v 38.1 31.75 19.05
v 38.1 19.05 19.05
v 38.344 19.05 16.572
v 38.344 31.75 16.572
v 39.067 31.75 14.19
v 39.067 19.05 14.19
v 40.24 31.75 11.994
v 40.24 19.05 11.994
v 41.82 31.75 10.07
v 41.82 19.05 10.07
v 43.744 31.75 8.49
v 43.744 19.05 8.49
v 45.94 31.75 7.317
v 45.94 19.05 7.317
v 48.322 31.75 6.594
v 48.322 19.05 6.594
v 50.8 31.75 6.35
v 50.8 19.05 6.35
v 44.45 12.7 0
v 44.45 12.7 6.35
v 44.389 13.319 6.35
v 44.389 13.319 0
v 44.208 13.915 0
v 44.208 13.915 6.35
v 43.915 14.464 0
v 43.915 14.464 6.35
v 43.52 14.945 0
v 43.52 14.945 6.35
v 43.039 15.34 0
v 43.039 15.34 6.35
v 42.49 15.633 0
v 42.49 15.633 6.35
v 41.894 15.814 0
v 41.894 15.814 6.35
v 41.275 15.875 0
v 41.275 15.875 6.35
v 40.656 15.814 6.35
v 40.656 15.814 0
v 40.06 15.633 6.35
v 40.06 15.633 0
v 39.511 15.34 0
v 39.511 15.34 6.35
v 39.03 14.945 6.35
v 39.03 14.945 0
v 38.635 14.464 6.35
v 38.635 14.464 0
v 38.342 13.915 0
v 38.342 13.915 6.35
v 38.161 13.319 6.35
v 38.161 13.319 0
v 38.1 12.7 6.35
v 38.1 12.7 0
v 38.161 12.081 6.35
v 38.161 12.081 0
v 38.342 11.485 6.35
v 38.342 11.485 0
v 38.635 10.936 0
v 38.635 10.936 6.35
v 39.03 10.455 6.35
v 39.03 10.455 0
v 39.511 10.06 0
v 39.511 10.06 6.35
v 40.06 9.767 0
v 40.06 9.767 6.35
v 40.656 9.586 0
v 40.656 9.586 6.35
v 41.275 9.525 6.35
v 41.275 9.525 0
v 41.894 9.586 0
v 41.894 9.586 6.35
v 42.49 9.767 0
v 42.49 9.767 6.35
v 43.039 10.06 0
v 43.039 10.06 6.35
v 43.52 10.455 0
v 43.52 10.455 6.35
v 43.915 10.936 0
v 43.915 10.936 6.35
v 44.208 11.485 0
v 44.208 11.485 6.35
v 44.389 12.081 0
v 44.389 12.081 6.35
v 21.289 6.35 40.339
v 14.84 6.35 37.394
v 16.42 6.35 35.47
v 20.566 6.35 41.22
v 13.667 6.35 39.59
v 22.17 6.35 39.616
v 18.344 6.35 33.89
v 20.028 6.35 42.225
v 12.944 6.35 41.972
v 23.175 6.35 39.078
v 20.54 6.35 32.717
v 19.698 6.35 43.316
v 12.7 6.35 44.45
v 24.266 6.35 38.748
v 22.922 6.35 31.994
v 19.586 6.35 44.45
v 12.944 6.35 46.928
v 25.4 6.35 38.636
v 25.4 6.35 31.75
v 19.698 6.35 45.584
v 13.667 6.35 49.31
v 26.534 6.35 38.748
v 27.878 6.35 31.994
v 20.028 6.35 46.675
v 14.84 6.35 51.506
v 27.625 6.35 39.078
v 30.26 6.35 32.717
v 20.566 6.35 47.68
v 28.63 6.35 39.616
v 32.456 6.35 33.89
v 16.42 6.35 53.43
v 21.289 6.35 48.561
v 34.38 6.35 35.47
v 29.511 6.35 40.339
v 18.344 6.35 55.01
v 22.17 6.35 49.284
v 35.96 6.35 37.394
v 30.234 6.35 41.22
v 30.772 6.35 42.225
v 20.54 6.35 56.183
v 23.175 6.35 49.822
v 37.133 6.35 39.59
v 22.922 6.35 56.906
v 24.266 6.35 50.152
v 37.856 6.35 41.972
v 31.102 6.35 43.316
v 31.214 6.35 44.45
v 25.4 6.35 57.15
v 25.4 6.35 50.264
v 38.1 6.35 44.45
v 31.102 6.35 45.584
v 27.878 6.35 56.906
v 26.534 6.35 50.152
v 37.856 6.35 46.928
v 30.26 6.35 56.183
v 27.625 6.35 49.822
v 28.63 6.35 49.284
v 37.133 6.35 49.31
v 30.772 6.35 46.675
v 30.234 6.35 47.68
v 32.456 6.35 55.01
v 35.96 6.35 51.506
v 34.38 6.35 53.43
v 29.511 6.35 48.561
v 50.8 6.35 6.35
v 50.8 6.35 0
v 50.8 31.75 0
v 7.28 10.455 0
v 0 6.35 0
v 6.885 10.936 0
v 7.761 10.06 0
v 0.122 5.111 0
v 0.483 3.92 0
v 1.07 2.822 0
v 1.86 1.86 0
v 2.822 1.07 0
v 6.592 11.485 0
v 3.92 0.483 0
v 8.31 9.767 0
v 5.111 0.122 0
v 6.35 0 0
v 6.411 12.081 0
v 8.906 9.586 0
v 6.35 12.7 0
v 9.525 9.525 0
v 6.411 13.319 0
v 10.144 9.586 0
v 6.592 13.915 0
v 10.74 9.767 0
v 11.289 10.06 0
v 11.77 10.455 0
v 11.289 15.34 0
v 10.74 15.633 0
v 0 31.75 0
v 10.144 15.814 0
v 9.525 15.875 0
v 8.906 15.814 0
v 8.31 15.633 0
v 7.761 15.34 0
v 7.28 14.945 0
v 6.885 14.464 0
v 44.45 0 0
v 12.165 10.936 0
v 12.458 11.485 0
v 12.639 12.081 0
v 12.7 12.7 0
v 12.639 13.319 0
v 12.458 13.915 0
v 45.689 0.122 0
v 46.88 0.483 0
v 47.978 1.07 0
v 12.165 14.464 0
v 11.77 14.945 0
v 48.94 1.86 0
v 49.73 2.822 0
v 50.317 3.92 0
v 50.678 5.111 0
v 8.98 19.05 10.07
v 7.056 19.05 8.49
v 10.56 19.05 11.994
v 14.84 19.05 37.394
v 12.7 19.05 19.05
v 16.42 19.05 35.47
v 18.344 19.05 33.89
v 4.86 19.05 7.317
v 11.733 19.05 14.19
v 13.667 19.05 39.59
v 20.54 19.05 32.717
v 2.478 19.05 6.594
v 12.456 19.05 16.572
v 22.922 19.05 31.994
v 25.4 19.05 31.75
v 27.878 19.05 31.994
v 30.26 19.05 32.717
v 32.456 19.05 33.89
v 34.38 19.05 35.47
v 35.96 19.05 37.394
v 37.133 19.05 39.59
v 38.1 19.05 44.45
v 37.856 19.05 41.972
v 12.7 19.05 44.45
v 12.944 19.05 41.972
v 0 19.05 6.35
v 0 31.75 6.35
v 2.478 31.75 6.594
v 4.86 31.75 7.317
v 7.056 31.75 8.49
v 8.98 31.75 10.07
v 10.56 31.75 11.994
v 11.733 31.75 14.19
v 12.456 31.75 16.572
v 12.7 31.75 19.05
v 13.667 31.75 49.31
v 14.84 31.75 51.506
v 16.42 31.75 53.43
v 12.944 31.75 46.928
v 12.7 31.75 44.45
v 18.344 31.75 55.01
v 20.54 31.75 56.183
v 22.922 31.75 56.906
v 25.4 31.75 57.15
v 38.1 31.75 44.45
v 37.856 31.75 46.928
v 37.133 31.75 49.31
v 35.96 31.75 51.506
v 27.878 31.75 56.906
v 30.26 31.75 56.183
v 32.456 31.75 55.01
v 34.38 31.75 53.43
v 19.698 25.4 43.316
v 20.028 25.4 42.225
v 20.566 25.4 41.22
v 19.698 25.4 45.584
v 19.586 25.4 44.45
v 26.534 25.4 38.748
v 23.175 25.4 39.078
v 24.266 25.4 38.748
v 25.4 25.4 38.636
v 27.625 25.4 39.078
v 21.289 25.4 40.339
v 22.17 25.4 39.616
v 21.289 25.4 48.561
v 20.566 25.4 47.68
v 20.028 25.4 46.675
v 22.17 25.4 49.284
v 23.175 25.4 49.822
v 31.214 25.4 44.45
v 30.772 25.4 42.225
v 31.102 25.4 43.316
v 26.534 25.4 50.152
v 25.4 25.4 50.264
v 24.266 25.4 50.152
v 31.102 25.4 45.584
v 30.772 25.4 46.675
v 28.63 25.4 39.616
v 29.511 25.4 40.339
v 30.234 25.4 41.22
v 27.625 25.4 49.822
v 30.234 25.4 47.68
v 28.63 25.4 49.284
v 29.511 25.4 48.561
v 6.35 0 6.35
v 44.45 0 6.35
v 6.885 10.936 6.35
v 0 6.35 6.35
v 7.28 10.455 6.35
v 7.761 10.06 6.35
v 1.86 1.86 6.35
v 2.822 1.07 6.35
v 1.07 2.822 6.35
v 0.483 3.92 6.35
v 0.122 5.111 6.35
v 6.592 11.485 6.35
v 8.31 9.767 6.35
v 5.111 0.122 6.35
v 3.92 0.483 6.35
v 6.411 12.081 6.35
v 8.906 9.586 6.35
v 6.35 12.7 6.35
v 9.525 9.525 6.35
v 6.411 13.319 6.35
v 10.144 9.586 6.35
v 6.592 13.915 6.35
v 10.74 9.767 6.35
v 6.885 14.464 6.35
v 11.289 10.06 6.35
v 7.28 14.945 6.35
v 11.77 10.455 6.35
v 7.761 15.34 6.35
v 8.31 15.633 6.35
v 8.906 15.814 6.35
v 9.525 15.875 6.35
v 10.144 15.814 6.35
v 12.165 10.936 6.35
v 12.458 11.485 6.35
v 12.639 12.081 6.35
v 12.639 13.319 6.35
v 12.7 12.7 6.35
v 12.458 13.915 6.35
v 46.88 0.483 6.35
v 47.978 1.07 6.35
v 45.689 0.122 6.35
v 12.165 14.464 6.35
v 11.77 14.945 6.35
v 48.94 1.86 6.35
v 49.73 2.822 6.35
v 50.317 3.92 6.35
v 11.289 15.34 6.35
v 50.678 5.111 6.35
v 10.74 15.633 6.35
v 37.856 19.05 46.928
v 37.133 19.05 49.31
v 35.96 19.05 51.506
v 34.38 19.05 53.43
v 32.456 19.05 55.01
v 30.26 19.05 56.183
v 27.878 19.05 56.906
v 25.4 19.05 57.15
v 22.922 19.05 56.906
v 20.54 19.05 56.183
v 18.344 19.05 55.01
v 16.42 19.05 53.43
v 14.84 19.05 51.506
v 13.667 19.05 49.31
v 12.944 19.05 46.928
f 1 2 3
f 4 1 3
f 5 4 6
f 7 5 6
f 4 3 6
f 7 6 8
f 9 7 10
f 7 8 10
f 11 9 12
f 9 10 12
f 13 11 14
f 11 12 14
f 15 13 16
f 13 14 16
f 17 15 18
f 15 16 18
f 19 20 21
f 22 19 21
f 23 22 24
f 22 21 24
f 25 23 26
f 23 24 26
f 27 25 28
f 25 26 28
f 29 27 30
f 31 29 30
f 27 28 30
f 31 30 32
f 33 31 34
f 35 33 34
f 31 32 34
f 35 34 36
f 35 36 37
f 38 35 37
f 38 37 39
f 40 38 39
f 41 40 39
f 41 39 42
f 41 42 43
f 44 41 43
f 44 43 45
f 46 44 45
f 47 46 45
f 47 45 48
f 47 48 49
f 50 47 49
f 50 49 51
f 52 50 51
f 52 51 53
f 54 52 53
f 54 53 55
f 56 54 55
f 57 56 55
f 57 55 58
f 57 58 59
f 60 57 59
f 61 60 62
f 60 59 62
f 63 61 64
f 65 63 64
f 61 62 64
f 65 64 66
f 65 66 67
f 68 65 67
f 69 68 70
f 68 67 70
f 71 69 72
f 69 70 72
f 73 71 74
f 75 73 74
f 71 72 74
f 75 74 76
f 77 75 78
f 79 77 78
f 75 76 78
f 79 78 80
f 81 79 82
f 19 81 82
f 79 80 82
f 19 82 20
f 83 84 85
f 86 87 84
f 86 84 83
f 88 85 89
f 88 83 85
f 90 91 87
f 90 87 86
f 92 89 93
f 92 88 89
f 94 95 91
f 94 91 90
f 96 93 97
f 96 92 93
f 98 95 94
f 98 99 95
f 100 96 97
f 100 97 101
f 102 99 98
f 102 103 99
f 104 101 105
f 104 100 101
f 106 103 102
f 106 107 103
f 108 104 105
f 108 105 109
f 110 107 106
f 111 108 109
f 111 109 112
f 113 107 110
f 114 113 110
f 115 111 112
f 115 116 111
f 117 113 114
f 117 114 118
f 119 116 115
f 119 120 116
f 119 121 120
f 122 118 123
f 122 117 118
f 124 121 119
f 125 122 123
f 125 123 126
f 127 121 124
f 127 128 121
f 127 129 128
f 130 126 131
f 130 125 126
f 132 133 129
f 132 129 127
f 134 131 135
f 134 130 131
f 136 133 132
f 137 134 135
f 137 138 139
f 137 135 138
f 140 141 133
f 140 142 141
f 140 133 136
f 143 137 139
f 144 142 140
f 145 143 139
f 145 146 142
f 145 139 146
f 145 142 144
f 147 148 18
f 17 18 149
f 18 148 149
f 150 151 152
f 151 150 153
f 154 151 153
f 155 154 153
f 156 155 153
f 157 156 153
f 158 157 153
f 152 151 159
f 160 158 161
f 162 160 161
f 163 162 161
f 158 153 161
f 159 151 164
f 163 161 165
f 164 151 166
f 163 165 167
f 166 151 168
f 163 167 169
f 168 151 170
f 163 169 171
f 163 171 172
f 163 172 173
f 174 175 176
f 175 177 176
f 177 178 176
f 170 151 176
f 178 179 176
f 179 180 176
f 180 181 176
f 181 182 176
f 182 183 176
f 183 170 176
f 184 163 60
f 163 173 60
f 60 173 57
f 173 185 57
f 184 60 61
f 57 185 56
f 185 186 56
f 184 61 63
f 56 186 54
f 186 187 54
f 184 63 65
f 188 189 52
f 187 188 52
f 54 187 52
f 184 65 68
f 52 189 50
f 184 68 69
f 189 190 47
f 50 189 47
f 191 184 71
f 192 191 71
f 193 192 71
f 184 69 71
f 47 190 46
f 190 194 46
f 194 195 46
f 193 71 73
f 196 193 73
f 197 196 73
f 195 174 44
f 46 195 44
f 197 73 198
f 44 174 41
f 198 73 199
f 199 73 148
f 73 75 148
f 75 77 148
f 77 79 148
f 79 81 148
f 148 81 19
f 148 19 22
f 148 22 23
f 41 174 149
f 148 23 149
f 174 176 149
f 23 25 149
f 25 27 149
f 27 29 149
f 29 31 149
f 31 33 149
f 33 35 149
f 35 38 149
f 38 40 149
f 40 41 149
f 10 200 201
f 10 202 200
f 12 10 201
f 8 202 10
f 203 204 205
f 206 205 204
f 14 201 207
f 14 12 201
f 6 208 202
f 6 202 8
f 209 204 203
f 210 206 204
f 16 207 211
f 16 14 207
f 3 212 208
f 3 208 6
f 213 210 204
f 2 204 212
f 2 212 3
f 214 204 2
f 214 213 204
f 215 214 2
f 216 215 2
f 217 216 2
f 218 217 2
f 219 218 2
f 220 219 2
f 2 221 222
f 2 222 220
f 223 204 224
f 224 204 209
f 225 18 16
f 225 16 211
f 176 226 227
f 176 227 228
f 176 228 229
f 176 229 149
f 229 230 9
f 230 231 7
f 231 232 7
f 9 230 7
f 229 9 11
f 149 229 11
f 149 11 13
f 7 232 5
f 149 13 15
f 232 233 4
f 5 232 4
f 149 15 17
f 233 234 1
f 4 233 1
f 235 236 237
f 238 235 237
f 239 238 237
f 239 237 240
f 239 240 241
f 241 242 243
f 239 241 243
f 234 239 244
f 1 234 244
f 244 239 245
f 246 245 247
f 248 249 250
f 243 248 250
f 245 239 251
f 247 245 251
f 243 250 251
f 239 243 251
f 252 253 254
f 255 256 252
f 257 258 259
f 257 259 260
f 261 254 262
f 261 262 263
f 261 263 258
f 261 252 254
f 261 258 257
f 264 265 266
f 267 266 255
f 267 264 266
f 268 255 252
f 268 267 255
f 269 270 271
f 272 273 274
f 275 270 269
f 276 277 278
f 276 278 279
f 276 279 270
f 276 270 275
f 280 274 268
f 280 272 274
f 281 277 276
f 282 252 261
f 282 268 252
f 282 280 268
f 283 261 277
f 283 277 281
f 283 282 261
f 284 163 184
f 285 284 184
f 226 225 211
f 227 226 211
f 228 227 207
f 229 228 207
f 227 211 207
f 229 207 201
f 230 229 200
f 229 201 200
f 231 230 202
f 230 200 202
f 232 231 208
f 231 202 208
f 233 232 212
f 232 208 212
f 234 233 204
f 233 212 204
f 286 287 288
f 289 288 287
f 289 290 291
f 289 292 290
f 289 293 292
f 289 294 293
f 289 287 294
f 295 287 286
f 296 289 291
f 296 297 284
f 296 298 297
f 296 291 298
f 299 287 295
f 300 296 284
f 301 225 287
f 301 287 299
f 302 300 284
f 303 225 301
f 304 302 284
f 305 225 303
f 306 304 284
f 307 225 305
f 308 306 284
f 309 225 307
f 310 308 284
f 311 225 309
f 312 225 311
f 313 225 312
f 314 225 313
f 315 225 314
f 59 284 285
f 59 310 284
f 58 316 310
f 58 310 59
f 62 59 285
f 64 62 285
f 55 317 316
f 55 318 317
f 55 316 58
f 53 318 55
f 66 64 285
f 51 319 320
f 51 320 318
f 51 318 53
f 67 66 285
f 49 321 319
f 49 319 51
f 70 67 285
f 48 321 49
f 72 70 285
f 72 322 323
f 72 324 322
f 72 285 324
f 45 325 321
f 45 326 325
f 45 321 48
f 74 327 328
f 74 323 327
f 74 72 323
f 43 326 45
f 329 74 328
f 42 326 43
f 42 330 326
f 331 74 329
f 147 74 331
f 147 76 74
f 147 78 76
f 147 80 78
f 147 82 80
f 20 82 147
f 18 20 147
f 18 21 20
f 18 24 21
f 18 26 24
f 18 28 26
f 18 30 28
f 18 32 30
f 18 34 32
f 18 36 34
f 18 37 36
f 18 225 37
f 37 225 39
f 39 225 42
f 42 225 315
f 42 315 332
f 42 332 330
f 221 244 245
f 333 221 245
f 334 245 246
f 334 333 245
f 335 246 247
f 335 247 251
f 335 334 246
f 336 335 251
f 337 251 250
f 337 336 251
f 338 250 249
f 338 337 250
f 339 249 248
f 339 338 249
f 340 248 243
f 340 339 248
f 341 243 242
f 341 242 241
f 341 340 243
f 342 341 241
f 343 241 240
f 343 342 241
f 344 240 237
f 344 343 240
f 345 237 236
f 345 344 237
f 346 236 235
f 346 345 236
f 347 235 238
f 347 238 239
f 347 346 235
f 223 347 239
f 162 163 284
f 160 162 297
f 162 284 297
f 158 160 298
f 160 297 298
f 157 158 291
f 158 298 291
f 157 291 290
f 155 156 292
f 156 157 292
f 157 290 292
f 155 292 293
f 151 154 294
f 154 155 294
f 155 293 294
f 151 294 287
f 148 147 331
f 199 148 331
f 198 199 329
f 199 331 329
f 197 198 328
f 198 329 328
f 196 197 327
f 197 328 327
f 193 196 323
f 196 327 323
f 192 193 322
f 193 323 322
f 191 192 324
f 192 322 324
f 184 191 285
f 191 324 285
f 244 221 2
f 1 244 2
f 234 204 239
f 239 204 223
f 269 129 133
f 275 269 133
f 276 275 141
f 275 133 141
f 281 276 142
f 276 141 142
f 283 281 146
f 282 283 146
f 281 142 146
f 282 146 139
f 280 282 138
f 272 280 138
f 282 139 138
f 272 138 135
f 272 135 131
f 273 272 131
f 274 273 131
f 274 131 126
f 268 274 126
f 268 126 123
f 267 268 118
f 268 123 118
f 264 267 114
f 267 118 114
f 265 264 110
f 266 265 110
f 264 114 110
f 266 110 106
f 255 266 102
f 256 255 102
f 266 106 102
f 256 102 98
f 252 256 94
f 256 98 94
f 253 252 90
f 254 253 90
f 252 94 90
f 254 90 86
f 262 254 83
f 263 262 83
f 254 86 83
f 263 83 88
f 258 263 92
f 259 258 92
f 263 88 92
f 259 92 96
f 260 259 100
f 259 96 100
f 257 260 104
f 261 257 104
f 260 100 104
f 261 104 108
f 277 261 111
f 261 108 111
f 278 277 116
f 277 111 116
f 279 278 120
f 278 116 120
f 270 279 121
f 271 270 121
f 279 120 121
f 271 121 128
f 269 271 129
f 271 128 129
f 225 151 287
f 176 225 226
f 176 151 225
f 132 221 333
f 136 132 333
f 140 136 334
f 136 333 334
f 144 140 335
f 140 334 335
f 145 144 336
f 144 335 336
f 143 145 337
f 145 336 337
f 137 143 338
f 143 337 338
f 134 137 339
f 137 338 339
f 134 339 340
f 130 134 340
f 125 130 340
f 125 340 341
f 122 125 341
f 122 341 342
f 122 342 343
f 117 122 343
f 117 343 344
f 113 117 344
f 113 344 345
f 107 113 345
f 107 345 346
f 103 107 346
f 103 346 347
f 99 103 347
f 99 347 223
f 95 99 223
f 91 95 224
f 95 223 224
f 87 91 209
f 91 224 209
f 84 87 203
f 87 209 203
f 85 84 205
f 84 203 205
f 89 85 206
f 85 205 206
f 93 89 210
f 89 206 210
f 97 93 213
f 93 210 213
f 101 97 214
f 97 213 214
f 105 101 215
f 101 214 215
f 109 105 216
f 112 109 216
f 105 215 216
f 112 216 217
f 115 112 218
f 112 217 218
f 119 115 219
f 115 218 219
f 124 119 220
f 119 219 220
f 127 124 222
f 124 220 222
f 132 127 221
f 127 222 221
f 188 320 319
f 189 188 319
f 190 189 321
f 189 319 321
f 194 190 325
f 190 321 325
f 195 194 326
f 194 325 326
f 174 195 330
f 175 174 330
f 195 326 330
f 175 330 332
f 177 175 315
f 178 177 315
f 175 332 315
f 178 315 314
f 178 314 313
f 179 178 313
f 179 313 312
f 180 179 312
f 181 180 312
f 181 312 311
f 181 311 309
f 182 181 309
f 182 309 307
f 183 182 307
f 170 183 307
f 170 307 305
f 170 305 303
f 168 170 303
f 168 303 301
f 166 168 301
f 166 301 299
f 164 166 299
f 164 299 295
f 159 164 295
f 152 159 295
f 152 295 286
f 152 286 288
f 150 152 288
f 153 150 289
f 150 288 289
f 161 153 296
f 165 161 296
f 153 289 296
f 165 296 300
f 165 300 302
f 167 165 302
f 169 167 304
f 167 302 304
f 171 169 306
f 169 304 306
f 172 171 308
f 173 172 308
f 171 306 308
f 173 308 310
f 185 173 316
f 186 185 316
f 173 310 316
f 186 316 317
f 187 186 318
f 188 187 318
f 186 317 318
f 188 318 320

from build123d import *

# Parameters (mm, degrees)
F0_W      = 50.8
F0_H      = 31.75
F1_DEPTH  = 6.35
F3_DEPTH  = 25.4
F4_W      = 50.8
F4_H      = 12.7
F5_DEPTH  = 38.1
F6_R      = 3.175
F7_DEPTH  = 25.4
F9_DEPTH  = 25.4
F10_DEPTH = 25.4
F12_DEPTH = 12.7
F14_DEPTH = 12.7
F15_R     = 5.8141785566
F16_DEPTH = 19.05


# Not quite as in the source:
# - a feature names something its author has since deleted; it is built from what else it names


with BuildPart() as f1:
    # F0 (on Top) → F1 (new body)
    with BuildSketch(Plane.XY):
        with Locations((25.4, 15.875)):
            Rectangle(F0_W, F0_H)
    extrude(amount=F1_DEPTH)

    # F2 (on face) → F3 (cut)
    with BuildSketch(Plane.XY.offset(6.35)):
        with BuildLine():
            ThreePointArc((6.35, 0), (1.8598719395, 1.8598719395), (0, 6.35))
            Line((0, 6.35), (0, 0))
            Line((0, 0), (6.35, 0))
        make_face()
        with BuildLine():
            ThreePointArc((50.8, 6.35), (48.9401280605, 1.8598719395), (44.45, 0))
            Line((44.45, 0), (50.8, 0))
            Line((50.8, 0), (50.8, 6.35))
        make_face()
    extrude(amount=-F3_DEPTH, mode=Mode.SUBTRACT)

    # F4 (on face) → F5 (join)
    with BuildSketch(Plane.XY.offset(6.35)):
        with Locations((25.4, 25.4)):
            Rectangle(F4_W, F4_H)
    extrude(amount=F5_DEPTH)

    # F6 (on face) → F7 (cut)
    with BuildSketch(Plane.XY.offset(6.35)):
        with Locations((9.525, 12.7)):
            Circle(F6_R)
        with Locations((41.275, 12.7)):
            Circle(F6_R)
    extrude(amount=-F7_DEPTH, mode=Mode.SUBTRACT)

    # F8 (on face) → F9 (cut)
    with BuildSketch(Plane.XZ.offset(-19.05)):
        with BuildLine():
            Line((12.7, 19.05), (12.7, 44.45))
            Line((12.7, 44.45), (0, 44.45))
            Line((0, 44.45), (0, 6.35))
            ThreePointArc((0, 6.35), (8.9802561211, 10.0697438789), (12.7, 19.05))
        make_face()
        with BuildLine():
            Line((50.8, 44.45), (38.1, 44.45))
            Line((38.1, 44.45), (38.1, 19.05))
            ThreePointArc((38.1, 19.05), (41.8197438789, 10.0697438789), (50.8, 6.35))
            Line((50.8, 6.35), (50.8, 44.45))
        make_face()
    extrude(amount=-F9_DEPTH, mode=Mode.SUBTRACT)

    # F8 (on face) → F10 (cut)
    with BuildSketch(Plane.XZ.offset(-19.05)):
        with BuildLine():
            Line((12.7, 19.05), (12.7, 44.45))
            Line((12.7, 44.45), (0, 44.45))
            Line((0, 44.45), (0, 6.35))
            ThreePointArc((0, 6.35), (8.9802561211, 10.0697438789), (12.7, 19.05))
        make_face()
        with BuildLine():
            Line((38.1, 44.45), (12.7, 44.45))
            ThreePointArc((12.7, 44.45), (25.4, 31.75), (38.1, 44.45))
        make_face()
        with BuildLine():
            Line((50.8, 44.45), (38.1, 44.45))
            Line((38.1, 44.45), (38.1, 19.05))
            ThreePointArc((38.1, 19.05), (41.8197438789, 10.0697438789), (50.8, 6.35))
            Line((50.8, 6.35), (50.8, 44.45))
        make_face()
    extrude(amount=-F10_DEPTH, mode=Mode.SUBTRACT)

    # F11 (on face) → F12 (join)
    with BuildSketch(Plane.XZ.offset(-19.05)):
        with BuildLine():
            ThreePointArc((12.7, 44.45), (25.4, 31.75), (38.1, 44.45))
            ThreePointArc((38.1, 44.45), (25.4, 57.15), (12.7, 44.45))
        make_face()
    extrude(amount=-F12_DEPTH)

    # F13 (on face) → F14 (join)
    with BuildSketch(Plane.XZ.offset(-19.05)):
        with BuildLine():
            ThreePointArc((12.7, 44.45), (25.4, 31.75), (38.1, 44.45))
            ThreePointArc((38.1, 44.45), (25.4, 57.15), (12.7, 44.45))
        make_face()
    extrude(amount=F14_DEPTH)

    # F15 (on face) → F16 (cut)
    with BuildSketch(Plane.XZ.offset(-6.35)):
        with Locations((25.4, 44.45)):
            Circle(F15_R)
    extrude(amount=-F16_DEPTH, mode=Mode.SUBTRACT)


solid = f1.part
